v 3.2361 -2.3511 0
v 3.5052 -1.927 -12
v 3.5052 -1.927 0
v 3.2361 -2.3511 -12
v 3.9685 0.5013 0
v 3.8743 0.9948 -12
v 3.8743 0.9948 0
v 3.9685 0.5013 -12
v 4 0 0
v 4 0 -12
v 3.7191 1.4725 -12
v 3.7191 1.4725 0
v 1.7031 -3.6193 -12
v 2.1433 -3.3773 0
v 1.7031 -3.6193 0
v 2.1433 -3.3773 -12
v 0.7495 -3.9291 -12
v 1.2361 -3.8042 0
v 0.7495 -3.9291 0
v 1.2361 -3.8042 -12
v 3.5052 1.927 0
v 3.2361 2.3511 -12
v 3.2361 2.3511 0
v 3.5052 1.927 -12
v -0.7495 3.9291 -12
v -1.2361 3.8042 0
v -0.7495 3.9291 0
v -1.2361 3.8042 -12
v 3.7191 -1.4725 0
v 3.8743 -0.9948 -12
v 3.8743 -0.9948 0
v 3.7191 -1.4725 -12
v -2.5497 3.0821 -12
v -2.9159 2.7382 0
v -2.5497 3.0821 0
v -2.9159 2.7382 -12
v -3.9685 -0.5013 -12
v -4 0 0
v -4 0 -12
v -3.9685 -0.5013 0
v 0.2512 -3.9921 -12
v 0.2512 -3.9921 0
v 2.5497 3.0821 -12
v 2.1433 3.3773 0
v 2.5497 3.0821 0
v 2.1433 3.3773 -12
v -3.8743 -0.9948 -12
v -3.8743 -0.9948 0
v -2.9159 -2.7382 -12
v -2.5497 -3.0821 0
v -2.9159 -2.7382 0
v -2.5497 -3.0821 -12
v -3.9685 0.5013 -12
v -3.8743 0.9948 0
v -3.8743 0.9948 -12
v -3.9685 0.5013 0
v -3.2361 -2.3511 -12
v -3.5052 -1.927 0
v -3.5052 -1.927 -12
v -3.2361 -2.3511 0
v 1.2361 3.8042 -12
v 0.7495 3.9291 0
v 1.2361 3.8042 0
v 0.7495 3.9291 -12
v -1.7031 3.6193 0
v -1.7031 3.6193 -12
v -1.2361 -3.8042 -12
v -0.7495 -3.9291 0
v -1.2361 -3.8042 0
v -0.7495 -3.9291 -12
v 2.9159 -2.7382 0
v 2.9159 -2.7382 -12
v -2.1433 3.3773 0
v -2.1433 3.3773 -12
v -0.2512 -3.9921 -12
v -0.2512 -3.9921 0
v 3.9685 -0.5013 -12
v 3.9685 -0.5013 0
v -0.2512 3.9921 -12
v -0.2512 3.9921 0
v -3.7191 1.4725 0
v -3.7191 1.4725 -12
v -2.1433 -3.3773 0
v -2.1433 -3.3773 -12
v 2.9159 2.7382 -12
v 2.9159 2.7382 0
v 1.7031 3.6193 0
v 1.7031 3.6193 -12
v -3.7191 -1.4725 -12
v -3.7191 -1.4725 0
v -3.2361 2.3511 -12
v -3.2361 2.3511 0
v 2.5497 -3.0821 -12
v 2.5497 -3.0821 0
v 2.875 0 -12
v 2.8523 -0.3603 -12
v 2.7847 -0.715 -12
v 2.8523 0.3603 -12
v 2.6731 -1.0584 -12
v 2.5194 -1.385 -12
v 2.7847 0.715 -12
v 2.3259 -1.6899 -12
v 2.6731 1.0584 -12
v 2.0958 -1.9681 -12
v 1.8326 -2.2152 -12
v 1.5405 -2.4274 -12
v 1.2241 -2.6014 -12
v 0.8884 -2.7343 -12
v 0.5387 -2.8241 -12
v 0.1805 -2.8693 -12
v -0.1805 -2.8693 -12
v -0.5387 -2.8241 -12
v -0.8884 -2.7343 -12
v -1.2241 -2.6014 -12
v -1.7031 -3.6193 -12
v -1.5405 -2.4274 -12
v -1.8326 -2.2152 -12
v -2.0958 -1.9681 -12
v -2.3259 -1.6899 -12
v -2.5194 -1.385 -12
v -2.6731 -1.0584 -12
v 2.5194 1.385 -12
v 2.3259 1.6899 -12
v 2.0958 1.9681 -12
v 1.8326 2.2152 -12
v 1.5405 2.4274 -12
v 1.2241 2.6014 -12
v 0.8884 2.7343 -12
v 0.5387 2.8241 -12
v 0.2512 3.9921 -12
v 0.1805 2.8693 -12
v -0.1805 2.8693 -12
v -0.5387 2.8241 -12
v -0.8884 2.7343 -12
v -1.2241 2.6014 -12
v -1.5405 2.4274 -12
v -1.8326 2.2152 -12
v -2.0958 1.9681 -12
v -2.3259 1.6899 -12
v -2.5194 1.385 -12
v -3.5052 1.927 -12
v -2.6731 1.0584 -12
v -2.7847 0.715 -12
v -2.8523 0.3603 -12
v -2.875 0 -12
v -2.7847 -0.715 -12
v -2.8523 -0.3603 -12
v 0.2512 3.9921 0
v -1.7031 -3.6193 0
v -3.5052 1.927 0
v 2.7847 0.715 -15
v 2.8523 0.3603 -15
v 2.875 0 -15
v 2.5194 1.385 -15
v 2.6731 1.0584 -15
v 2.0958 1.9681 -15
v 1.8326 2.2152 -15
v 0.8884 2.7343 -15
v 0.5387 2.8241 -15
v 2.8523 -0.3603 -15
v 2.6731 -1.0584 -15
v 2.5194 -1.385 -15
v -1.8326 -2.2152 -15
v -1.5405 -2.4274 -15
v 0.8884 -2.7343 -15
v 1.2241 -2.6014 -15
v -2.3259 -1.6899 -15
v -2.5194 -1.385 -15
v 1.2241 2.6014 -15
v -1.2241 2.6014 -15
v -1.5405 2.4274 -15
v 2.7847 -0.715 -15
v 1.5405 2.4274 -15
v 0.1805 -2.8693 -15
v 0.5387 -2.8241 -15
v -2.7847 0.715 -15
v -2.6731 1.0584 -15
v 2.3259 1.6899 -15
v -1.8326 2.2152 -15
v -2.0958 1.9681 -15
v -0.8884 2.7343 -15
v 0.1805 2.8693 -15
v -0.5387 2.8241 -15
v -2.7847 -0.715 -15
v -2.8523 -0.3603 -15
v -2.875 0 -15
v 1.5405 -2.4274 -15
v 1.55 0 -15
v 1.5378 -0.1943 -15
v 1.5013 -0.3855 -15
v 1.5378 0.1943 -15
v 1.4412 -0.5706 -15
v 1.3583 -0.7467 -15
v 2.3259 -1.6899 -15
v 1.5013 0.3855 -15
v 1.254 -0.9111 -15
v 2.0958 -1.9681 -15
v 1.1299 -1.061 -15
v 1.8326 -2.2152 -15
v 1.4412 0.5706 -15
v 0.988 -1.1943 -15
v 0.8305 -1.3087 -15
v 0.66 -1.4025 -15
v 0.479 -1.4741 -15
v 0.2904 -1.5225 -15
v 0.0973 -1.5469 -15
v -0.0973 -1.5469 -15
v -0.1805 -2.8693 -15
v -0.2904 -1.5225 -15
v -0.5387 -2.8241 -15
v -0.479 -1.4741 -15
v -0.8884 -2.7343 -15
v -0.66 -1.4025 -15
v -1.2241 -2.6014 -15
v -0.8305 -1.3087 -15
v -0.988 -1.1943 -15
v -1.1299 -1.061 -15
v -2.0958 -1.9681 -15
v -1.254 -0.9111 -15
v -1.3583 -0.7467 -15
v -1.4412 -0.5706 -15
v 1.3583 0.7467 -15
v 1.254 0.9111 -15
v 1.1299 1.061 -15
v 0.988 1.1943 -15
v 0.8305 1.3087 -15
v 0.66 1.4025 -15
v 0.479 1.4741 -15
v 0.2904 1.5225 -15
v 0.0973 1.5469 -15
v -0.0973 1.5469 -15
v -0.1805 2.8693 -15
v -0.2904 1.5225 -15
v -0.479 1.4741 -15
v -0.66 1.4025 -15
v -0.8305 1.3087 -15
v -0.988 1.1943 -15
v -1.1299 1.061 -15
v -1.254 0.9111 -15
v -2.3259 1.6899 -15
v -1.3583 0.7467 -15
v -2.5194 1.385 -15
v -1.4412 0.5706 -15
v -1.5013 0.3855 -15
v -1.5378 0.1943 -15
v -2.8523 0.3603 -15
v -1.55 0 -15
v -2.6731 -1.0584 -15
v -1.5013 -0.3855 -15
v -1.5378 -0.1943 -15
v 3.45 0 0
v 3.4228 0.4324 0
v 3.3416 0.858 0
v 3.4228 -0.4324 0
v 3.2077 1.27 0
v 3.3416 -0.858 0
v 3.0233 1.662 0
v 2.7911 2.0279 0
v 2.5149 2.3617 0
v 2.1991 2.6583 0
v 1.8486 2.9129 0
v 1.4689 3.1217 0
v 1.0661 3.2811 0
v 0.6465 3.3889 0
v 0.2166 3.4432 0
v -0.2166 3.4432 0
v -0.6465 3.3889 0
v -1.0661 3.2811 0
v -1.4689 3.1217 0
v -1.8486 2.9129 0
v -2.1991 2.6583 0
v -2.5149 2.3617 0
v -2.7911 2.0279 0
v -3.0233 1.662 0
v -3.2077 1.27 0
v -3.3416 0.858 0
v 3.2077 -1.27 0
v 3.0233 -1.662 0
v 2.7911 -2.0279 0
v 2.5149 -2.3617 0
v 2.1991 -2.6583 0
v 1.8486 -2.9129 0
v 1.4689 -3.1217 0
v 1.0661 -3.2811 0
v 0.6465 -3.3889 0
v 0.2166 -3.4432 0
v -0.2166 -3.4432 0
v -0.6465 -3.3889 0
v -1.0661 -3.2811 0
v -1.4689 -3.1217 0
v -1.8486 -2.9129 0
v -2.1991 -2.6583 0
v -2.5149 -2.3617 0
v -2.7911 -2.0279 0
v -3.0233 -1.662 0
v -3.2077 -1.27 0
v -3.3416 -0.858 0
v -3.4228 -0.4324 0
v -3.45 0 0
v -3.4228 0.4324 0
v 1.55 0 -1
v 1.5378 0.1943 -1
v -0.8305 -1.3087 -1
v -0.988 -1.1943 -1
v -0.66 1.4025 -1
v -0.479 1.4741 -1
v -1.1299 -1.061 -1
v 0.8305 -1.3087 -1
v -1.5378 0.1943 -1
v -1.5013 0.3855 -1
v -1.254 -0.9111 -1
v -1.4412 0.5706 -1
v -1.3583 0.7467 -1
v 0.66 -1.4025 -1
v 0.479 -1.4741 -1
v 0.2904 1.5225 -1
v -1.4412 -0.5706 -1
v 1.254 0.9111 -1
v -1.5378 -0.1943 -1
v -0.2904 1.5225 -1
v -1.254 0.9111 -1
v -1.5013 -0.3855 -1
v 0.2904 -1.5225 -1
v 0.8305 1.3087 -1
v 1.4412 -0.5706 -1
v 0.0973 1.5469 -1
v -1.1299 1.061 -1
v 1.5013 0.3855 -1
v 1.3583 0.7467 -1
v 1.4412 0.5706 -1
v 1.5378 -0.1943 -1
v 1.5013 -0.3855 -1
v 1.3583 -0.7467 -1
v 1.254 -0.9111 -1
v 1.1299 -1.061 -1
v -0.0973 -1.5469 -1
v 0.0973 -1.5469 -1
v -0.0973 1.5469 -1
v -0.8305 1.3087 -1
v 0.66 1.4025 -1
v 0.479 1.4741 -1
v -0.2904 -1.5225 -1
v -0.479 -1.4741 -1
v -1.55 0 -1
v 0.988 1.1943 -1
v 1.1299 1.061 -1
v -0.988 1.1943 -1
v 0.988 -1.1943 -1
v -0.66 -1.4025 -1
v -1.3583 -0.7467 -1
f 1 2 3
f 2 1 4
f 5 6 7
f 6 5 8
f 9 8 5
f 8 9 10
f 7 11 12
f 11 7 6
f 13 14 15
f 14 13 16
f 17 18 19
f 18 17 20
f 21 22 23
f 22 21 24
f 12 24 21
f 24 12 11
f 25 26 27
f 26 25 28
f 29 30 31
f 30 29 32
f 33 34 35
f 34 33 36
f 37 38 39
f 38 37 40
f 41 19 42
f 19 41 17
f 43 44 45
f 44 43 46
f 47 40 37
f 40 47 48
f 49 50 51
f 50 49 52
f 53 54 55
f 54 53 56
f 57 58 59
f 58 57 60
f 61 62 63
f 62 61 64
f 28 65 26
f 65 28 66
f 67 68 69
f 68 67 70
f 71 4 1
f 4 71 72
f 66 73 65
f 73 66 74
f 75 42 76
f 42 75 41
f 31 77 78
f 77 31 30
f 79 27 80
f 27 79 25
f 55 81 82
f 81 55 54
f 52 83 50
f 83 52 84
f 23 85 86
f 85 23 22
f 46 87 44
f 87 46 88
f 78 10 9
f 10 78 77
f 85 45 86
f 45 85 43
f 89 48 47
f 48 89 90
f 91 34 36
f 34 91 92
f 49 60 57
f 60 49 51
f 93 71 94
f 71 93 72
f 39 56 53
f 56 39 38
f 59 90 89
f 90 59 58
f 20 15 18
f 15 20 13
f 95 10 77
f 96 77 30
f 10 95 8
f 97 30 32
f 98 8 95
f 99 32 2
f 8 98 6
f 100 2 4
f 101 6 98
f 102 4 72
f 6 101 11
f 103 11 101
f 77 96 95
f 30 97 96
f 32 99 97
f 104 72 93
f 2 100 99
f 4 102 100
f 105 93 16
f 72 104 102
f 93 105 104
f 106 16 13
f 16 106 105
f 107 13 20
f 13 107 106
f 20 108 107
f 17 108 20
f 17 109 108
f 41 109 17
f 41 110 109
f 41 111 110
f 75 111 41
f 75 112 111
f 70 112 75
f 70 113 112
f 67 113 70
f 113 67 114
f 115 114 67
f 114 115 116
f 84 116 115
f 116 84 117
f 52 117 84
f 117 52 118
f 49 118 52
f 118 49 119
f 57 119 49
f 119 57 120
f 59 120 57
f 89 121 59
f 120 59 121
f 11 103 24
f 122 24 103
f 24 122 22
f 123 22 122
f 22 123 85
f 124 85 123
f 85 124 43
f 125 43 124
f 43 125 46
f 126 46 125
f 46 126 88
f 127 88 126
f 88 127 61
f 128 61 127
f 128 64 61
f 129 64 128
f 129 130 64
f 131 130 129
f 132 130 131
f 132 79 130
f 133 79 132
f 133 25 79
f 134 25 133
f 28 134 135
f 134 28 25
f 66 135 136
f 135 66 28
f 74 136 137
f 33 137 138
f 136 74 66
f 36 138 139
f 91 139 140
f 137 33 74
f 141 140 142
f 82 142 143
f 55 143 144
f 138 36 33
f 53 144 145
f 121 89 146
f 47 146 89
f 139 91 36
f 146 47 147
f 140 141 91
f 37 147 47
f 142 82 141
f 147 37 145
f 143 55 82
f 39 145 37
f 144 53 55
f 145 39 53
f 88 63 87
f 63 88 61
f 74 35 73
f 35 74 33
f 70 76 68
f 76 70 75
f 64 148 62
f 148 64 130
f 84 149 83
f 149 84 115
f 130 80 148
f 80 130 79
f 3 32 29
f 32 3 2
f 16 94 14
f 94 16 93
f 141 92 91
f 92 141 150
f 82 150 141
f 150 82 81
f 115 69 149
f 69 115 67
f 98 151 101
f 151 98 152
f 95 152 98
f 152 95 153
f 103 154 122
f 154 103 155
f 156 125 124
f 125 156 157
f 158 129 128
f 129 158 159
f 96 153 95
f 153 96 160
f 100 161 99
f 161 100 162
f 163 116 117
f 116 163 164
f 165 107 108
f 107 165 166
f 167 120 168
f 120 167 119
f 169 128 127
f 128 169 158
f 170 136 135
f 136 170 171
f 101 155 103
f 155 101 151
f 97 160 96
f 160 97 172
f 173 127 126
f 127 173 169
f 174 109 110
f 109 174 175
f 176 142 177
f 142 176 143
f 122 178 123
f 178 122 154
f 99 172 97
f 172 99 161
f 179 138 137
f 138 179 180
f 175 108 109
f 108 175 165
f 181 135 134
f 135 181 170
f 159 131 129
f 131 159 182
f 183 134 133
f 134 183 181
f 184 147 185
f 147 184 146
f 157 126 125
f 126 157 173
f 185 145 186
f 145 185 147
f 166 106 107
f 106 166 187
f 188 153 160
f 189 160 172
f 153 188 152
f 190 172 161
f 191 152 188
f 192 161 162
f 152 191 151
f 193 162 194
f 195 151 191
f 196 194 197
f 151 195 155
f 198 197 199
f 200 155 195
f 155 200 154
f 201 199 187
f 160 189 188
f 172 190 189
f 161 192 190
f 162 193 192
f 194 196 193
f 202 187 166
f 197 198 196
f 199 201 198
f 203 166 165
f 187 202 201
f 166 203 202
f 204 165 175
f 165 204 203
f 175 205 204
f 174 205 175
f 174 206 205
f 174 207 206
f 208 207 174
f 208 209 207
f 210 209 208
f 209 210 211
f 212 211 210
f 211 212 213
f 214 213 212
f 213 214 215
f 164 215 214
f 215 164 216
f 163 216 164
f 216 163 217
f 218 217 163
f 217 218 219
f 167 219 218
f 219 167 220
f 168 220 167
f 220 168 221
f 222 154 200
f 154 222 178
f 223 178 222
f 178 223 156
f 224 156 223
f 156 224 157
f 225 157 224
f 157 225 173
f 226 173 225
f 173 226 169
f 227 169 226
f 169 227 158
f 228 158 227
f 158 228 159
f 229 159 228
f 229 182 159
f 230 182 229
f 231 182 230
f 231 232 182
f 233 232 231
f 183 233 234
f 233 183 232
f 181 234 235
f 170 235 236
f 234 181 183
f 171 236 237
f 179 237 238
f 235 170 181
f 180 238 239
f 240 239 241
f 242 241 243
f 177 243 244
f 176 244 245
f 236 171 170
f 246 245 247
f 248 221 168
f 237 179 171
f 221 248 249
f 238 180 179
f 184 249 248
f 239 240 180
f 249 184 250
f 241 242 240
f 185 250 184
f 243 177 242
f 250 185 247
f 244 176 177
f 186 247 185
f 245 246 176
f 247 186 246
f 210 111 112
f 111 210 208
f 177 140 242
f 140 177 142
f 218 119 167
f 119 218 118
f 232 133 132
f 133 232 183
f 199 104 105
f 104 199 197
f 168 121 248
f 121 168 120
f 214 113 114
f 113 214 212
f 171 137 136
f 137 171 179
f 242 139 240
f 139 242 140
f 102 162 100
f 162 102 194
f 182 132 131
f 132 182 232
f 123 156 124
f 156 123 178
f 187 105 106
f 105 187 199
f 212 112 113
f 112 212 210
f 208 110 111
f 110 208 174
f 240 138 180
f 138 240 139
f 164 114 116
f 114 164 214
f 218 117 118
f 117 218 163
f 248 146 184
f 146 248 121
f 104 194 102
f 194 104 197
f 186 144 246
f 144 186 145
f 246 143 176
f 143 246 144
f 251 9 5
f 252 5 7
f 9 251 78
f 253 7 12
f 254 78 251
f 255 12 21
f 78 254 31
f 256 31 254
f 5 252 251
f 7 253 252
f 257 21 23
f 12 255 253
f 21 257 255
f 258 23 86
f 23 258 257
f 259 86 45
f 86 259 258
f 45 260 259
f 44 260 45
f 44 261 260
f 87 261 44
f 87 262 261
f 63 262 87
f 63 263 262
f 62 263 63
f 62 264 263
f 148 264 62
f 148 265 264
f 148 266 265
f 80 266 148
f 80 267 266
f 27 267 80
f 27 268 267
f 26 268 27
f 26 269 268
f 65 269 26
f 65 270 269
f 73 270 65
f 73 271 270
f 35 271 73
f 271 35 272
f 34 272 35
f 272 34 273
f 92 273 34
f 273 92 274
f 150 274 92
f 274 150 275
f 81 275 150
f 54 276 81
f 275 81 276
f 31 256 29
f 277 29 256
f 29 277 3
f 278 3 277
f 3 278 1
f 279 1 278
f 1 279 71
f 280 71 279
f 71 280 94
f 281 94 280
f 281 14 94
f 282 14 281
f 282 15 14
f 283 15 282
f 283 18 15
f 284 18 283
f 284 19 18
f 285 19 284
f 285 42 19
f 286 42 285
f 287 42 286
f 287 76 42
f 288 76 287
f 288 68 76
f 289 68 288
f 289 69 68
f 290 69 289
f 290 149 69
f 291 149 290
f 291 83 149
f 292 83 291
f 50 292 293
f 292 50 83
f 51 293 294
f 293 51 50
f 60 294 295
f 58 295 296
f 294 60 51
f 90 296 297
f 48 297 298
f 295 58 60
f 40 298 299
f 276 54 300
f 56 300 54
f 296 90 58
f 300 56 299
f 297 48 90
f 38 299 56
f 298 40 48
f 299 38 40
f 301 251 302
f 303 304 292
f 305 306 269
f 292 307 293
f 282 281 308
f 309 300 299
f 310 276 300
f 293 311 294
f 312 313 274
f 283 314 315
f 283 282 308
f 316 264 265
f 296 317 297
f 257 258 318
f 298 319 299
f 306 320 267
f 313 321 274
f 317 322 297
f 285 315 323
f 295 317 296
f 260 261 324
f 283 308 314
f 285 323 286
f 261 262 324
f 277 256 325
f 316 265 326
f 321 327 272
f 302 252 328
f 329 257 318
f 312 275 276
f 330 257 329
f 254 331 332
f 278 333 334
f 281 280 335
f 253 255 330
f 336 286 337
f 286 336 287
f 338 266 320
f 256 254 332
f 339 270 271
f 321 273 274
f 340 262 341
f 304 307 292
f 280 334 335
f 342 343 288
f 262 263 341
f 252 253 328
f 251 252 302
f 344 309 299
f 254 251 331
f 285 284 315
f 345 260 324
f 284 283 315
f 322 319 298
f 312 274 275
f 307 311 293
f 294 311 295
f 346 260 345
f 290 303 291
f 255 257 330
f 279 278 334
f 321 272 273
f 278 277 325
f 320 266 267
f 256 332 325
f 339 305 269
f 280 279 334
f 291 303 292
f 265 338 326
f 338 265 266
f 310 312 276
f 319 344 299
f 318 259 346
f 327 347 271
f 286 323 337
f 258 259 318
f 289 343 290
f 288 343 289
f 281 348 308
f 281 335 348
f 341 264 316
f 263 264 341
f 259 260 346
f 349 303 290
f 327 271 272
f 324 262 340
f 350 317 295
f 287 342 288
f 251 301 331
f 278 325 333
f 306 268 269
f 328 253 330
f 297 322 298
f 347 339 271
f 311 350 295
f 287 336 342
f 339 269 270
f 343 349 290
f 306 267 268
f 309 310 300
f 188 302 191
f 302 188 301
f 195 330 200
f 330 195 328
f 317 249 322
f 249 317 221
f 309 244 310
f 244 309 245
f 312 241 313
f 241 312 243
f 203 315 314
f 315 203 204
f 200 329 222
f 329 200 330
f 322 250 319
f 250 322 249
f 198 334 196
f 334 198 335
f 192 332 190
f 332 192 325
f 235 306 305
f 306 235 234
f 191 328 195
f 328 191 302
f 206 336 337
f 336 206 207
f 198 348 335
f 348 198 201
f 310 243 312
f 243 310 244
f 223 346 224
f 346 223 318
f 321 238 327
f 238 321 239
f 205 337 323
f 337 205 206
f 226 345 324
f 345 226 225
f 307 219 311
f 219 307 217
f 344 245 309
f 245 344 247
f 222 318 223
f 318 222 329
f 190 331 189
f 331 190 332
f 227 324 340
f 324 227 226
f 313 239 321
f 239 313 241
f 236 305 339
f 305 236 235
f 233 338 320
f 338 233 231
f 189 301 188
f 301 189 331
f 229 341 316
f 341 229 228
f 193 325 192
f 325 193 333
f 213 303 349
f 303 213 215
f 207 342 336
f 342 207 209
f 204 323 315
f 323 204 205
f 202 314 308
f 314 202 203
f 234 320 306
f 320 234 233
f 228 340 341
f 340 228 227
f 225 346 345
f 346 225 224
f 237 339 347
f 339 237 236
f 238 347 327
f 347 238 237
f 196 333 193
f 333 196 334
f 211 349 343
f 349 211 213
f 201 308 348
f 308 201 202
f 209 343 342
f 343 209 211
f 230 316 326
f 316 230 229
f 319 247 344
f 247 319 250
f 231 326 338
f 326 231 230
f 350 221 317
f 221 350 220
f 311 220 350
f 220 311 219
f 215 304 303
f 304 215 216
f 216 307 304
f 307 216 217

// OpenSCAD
$fn = 50;

difference() {
	union() {
		translate(v = [0, 0, -12.0]) {
			cylinder(h = 15, r = 4.0);
		}
		#translate(v = [0, 0, -15.0]) {
			cylinder(h = 15, r = 2.875);
		}
	}
	union() {
		translate(v = [0, 0, 0]) {
			rotate(a = [0, 0, 0]) {
				difference() {
					union() {
						translate(v = [0, 0, -15.0]) {
							cylinder(h = 15, r = 1.25);
						}
						translate(v = [0, 0, -1.0]) {
							cylinder(h = 1.0, r1 = 1.55, r2 = 3.45);
						}
						translate(v = [0, 0, -15.0]) {
							cylinder(h = 15, r = 1.55);
						}
						translate(v = [0, 0, -15.0]) {
							cylinder(h = 15, r = 1.25);
						}
					}
					union();
				}
			}
		}
		#cylinder(h = 3, r = 5.0);
	}
}
